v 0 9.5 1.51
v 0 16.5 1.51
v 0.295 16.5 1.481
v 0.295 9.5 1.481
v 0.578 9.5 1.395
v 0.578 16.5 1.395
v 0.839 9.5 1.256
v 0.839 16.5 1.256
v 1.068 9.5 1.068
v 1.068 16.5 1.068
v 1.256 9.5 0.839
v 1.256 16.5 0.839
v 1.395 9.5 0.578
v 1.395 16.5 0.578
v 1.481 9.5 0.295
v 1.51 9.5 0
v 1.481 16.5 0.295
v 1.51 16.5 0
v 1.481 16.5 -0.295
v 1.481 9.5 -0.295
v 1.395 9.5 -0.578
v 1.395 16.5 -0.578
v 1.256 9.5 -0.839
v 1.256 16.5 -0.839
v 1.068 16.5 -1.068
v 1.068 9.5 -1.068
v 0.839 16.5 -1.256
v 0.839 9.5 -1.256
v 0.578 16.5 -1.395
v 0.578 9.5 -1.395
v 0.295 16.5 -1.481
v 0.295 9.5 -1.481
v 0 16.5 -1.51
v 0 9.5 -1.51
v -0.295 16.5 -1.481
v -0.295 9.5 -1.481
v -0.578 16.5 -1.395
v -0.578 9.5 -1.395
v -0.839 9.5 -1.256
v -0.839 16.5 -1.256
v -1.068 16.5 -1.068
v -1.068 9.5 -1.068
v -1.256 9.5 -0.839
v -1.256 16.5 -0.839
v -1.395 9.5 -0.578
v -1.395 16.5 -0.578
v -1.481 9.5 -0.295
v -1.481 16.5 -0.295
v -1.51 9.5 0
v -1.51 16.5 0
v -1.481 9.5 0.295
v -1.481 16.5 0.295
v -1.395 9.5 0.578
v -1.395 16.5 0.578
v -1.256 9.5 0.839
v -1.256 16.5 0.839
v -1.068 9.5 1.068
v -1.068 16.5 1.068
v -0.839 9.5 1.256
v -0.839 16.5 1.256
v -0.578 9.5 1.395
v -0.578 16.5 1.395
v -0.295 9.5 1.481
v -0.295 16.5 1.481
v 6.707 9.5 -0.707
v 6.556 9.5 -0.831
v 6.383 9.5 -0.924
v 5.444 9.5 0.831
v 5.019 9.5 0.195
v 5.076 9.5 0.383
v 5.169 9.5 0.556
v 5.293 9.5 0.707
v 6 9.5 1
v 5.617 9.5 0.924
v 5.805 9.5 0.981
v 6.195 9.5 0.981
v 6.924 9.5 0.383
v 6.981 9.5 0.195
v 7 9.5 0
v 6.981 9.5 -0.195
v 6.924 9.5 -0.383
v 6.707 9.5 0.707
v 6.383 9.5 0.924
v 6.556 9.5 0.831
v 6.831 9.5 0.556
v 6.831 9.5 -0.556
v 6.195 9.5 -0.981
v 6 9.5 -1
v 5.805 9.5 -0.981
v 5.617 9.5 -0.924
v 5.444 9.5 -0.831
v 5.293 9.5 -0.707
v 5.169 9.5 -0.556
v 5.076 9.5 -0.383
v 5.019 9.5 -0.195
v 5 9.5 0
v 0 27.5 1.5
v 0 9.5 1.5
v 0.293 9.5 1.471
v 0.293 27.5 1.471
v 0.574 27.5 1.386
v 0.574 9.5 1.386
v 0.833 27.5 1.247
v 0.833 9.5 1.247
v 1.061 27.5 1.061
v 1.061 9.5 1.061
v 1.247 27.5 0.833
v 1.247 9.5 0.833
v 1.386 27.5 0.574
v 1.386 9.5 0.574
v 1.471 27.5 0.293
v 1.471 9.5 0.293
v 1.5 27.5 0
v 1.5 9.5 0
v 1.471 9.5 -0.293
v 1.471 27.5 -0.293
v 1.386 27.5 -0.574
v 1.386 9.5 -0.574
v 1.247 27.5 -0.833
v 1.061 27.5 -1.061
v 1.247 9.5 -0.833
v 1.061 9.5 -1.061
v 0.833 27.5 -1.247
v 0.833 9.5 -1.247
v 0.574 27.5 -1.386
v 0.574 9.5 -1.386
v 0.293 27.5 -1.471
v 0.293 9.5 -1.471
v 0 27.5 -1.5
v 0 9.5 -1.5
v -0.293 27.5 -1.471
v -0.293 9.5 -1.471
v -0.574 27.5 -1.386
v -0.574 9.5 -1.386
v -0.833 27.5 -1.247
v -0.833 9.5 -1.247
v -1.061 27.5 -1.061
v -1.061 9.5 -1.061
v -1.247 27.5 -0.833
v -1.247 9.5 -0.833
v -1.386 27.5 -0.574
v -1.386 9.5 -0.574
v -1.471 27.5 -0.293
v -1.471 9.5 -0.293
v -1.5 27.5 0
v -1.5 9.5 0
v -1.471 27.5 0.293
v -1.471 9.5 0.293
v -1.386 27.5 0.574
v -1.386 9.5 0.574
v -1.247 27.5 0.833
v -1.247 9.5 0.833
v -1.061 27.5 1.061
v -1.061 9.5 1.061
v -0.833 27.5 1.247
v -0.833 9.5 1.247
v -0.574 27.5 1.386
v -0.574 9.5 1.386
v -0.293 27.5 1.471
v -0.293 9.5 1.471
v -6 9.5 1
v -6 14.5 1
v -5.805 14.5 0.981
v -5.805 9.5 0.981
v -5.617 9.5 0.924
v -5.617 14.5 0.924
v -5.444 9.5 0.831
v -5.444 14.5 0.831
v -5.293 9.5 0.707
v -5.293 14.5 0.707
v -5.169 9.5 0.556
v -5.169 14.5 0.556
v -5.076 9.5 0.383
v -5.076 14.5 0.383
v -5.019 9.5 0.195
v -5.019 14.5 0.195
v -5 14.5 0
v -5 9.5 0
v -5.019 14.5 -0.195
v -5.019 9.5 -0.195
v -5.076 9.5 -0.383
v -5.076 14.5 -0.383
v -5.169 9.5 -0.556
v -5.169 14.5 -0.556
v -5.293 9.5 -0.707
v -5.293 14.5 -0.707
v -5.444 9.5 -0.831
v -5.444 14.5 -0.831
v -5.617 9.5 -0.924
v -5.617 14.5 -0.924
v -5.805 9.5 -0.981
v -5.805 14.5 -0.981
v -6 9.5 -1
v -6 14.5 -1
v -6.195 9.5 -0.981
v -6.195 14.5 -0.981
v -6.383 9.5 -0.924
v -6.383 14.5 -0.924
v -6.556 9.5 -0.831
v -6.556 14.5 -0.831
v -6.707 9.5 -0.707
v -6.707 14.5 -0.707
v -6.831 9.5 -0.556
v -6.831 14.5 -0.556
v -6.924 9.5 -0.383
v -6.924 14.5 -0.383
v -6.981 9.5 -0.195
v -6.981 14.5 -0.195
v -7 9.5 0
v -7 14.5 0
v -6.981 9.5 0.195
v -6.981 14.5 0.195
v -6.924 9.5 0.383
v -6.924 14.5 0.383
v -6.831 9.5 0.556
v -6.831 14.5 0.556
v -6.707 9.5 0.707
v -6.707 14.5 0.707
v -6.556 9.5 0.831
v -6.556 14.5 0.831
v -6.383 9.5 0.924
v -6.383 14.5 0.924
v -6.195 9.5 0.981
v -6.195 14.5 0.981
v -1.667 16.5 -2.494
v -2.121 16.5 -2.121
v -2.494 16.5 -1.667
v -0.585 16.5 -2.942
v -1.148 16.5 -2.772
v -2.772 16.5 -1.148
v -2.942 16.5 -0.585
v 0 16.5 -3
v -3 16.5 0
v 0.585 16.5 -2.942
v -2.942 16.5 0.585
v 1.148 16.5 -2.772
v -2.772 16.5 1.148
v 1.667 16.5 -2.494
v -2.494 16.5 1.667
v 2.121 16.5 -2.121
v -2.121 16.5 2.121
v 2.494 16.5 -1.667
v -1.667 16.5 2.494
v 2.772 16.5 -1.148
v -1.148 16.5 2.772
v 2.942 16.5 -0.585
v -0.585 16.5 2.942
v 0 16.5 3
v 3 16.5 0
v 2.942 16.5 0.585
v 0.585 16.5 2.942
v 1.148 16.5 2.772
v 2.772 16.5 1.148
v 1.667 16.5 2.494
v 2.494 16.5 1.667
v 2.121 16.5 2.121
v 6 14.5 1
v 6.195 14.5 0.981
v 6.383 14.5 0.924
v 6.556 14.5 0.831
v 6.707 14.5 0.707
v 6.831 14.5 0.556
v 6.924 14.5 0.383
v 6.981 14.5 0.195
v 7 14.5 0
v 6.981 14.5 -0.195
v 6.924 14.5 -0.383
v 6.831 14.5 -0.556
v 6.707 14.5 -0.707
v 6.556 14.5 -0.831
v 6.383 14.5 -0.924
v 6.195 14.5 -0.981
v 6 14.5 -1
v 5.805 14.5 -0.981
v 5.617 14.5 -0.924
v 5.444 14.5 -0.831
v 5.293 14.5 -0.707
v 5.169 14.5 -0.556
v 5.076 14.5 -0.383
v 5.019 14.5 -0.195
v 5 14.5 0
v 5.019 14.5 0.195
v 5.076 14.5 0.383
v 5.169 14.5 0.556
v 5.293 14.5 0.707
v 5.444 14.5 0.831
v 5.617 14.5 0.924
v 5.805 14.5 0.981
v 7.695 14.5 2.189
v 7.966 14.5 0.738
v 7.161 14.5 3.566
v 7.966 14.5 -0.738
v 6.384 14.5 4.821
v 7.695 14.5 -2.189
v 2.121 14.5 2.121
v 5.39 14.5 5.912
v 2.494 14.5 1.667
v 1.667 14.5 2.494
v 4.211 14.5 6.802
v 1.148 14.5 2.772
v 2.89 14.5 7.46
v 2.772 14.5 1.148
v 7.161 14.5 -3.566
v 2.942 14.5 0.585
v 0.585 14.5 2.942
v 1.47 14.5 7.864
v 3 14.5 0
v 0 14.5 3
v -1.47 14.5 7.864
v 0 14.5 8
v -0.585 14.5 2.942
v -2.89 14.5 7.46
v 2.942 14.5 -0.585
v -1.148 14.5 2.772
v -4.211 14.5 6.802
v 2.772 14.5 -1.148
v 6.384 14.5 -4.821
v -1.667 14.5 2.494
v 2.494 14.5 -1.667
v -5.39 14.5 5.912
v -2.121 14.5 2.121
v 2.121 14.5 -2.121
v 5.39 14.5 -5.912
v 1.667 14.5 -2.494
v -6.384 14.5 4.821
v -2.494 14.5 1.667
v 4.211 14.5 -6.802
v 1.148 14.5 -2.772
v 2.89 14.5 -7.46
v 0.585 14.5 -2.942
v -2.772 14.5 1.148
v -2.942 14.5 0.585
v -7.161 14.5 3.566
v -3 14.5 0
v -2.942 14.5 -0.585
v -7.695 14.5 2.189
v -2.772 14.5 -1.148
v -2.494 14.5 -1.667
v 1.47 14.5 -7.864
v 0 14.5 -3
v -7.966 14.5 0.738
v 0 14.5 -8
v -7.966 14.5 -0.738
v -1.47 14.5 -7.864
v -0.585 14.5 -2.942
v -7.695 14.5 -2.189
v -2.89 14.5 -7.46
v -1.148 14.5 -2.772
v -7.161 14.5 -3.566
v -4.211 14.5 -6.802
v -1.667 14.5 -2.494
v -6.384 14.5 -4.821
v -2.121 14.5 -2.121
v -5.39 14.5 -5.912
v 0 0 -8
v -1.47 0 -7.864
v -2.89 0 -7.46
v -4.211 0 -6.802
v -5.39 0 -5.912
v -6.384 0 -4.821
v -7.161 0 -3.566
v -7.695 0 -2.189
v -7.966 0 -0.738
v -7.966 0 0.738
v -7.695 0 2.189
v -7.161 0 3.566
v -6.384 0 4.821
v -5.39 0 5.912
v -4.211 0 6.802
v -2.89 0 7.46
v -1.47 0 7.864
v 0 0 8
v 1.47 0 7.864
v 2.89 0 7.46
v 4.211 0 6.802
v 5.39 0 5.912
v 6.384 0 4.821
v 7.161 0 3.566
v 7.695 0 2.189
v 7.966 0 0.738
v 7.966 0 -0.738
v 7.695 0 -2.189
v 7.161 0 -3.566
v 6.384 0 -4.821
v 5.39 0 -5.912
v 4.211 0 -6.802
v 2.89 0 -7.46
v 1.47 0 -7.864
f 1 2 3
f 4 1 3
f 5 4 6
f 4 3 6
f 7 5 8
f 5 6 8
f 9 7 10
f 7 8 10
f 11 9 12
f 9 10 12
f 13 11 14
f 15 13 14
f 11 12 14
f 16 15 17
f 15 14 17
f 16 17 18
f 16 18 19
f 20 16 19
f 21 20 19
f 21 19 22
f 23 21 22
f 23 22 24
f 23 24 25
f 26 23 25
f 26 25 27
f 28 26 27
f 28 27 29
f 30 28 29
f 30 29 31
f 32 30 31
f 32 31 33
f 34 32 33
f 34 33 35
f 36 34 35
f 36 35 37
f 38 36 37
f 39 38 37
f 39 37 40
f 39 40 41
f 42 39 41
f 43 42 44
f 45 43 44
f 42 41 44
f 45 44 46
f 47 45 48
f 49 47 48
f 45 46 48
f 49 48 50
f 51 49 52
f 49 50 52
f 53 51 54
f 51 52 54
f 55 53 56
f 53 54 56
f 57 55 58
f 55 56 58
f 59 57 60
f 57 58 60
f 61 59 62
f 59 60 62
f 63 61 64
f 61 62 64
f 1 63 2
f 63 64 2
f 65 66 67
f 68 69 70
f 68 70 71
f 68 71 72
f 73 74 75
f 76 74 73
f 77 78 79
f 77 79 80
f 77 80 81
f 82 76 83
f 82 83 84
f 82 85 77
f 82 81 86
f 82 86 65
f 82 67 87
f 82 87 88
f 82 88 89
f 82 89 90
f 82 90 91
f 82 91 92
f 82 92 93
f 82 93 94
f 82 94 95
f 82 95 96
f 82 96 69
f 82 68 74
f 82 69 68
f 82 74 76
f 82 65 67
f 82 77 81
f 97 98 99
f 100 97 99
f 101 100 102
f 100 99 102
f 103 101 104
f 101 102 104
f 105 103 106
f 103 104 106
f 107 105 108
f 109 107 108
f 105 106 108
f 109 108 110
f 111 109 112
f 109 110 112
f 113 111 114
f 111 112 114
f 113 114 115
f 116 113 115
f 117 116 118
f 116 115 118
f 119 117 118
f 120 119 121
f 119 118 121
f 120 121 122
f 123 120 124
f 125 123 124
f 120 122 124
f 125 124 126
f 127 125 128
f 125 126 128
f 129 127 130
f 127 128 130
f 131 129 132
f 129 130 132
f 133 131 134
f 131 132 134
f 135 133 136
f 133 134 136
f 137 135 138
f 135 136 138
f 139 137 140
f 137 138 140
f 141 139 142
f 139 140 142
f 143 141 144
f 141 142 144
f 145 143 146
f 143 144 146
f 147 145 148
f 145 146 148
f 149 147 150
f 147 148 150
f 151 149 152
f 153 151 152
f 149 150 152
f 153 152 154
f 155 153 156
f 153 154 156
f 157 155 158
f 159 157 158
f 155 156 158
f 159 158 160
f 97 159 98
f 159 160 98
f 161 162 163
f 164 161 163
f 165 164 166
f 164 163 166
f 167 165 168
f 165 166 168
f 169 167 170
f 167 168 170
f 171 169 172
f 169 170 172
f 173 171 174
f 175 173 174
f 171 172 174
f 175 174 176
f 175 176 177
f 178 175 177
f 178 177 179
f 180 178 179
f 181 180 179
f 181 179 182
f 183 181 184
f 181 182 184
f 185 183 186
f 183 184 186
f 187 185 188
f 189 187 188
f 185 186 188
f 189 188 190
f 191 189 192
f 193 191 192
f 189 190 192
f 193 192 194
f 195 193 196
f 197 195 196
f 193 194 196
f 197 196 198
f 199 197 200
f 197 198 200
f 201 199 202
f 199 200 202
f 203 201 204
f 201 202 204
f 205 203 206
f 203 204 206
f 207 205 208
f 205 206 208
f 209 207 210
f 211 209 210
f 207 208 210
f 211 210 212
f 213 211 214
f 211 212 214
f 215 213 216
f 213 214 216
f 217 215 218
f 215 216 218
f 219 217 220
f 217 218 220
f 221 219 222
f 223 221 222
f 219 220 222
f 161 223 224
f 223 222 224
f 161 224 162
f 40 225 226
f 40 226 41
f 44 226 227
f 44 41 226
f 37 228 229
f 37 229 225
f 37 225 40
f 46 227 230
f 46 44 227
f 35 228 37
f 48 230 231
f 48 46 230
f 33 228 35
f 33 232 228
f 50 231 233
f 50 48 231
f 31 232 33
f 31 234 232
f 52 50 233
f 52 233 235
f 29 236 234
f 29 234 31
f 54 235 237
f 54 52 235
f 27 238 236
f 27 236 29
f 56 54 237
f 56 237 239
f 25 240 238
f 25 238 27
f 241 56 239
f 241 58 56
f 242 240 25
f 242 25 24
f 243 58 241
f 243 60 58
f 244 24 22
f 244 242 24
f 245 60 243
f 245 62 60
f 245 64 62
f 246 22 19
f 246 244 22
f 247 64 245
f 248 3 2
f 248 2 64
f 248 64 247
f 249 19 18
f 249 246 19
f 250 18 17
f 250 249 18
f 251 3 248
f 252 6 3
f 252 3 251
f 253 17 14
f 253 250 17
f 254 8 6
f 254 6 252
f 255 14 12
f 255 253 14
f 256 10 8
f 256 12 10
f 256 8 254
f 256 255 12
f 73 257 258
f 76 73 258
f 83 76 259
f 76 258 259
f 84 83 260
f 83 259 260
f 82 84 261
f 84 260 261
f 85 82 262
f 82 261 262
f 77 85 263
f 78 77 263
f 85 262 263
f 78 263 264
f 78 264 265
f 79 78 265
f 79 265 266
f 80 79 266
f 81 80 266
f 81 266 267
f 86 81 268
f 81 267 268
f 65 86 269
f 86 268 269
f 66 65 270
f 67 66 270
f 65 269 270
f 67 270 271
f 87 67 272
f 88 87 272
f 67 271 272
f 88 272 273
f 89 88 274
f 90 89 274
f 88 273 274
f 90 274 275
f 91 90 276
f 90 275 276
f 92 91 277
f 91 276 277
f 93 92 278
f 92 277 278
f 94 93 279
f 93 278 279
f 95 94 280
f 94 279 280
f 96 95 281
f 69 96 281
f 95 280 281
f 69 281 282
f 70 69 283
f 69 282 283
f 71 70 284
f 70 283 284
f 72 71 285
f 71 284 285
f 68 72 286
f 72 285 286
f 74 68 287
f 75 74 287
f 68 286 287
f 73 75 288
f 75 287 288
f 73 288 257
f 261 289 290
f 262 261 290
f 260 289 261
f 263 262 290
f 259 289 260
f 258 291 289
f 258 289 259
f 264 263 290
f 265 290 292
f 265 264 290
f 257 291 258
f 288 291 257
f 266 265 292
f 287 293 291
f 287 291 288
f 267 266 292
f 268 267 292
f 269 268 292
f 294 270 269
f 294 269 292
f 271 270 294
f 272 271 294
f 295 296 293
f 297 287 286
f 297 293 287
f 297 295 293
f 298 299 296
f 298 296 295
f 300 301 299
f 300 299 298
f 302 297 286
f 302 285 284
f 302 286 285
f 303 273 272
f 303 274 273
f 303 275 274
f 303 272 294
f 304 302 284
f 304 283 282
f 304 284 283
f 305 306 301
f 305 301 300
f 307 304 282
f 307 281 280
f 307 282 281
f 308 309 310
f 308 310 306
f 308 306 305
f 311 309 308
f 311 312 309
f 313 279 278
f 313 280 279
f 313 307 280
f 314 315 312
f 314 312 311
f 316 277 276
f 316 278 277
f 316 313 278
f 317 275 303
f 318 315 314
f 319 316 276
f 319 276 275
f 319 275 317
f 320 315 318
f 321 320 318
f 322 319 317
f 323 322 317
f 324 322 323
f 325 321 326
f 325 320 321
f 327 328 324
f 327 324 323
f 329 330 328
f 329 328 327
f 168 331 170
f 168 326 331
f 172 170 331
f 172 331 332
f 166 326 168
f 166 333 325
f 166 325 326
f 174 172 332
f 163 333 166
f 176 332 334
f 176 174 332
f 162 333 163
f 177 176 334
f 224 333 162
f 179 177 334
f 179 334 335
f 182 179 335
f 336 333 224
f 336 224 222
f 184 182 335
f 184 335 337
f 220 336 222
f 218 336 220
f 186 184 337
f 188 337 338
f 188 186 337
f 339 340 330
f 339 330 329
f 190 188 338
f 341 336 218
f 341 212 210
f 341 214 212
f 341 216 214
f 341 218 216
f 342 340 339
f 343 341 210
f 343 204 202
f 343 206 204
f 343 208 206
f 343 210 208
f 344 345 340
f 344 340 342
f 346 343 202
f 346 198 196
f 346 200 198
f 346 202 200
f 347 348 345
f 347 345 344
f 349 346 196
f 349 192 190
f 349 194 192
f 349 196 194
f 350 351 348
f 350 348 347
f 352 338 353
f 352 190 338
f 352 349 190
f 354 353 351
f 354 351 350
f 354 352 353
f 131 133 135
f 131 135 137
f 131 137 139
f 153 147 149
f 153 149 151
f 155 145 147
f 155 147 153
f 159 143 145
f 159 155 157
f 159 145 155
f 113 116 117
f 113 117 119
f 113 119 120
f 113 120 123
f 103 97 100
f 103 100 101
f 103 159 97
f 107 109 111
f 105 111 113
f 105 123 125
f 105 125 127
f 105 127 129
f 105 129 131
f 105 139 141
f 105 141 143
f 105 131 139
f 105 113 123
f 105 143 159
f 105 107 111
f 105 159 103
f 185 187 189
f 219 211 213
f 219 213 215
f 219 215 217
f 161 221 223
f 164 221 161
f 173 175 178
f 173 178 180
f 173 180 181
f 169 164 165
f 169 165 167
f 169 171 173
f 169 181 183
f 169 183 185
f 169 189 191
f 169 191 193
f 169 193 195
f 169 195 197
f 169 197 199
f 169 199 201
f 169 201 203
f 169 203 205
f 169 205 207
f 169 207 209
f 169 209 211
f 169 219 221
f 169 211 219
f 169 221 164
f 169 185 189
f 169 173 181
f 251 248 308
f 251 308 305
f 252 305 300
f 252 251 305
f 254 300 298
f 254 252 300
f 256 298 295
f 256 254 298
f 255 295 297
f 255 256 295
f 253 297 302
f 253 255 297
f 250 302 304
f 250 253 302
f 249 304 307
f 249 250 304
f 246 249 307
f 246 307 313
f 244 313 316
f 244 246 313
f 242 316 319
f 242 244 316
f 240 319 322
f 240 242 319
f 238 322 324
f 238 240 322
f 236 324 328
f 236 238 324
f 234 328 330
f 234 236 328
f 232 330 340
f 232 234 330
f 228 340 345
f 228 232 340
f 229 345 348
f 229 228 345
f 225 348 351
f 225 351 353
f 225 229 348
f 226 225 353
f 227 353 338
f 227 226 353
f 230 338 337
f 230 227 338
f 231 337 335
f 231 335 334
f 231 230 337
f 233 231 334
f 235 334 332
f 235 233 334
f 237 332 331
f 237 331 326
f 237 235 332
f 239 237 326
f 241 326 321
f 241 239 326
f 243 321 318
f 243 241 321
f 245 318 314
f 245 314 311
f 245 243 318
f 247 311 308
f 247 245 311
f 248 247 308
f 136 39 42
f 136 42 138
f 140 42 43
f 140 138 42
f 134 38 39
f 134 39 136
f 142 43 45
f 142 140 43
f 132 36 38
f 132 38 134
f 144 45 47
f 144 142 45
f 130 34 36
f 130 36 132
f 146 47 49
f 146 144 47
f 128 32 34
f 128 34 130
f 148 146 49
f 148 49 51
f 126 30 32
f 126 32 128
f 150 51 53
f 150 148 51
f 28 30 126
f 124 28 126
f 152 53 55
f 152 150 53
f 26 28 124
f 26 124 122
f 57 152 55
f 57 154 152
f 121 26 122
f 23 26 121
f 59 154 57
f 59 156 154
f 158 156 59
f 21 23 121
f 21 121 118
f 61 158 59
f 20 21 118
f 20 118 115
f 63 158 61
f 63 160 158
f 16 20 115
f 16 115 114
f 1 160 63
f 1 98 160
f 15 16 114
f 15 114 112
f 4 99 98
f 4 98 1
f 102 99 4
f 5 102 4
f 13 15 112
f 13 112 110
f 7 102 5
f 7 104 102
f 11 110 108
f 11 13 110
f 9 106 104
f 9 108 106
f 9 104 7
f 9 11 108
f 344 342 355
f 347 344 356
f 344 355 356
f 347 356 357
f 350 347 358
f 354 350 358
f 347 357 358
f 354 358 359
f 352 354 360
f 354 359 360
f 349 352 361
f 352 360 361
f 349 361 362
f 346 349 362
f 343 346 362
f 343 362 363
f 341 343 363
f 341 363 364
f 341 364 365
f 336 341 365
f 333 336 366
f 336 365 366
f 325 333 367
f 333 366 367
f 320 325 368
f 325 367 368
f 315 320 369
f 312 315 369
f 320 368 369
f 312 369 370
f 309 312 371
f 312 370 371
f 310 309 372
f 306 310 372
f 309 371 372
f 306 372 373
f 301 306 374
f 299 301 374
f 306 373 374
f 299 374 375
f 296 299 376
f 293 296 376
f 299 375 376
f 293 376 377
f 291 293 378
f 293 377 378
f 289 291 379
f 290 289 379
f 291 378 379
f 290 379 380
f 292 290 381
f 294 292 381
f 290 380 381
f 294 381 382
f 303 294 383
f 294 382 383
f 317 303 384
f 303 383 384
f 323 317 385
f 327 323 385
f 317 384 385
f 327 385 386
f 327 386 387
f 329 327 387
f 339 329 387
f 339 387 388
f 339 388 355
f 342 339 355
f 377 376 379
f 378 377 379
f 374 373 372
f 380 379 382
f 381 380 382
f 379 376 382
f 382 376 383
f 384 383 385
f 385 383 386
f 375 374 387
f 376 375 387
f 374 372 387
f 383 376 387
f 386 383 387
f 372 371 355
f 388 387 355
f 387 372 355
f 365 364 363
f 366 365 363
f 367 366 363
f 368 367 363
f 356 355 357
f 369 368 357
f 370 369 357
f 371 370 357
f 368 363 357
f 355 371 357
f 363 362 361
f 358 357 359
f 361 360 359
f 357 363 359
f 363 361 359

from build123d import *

# Parameters (mm, degrees)
CROQUIS1_R              = 8
SALIENTE_EXTRUIR1_DEPTH = 14.5
CROQUIS2_R              = 1
CROQUIS2_R_2            = 1.51
CORTAR_EXTRUIR1_DEPTH   = 5
SALIENTE_EXTRUIR2_START = 2
CROQUIS3_R              = 3
CROQUIS3_R_2            = 1.51
SALIENTE_EXTRUIR2_DEPTH = 2
CROQUIS4_R              = 1.5
SALIENTE_EXTRUIR3_DEPTH = 18


with BuildPart() as part:
    # Croquis1 → Saliente-Extruir1 (new body)
    with BuildSketch(Plane(origin=(0, 0, 0), x_dir=(1, 0, 0), z_dir=(0, 1, 0))):
        with Locations(Location((0, 0, 0), (0, 0, 90))):
            Circle(CROQUIS1_R)
    extrude(amount=SALIENTE_EXTRUIR1_DEPTH)

    # Croquis2 → Cortar-Extruir1 (cut)
    with BuildSketch(Plane(origin=(0, 14.5, 0), x_dir=(1, 0, 0), z_dir=(0, 1, 0))):
        with Locations(Location((6, 0, 0), (0, 0, 270))):
            Circle(CROQUIS2_R)
        with Locations(Location((-6, 0, 0), (0, 0, 270))):
            Circle(CROQUIS2_R)
        with Locations(Location((0, 0, 0), (0, 0, 270))):
            Circle(CROQUIS2_R_2)
    extrude(amount=-CORTAR_EXTRUIR1_DEPTH, mode=Mode.SUBTRACT)

    # Croquis3 → Saliente-Extruir2 (add)
    with BuildSketch(Plane(origin=(0, 14.5, 0), x_dir=(1, 0, 0), z_dir=(0, 1, 0)).offset(SALIENTE_EXTRUIR2_START)):
        with Locations(Location((0, 0, 0), (0, 0, 270))):
            Circle(CROQUIS3_R)
        with Locations(Location((0, 0, 0), (0, 0, 270))):
            Circle(CROQUIS3_R_2, mode=Mode.SUBTRACT)
    extrude(amount=-SALIENTE_EXTRUIR2_DEPTH)

    # Croquis4 → Saliente-Extruir3 (add)
    with BuildSketch(Plane(origin=(0, 9.5, 0), x_dir=(1, 0, 0), z_dir=(0, 1, 0))):
        with Locations(Location((0, 0, 0), (0, 0, 270))):
            Circle(CROQUIS4_R)
    extrude(amount=SALIENTE_EXTRUIR3_DEPTH)


solid = part.part
